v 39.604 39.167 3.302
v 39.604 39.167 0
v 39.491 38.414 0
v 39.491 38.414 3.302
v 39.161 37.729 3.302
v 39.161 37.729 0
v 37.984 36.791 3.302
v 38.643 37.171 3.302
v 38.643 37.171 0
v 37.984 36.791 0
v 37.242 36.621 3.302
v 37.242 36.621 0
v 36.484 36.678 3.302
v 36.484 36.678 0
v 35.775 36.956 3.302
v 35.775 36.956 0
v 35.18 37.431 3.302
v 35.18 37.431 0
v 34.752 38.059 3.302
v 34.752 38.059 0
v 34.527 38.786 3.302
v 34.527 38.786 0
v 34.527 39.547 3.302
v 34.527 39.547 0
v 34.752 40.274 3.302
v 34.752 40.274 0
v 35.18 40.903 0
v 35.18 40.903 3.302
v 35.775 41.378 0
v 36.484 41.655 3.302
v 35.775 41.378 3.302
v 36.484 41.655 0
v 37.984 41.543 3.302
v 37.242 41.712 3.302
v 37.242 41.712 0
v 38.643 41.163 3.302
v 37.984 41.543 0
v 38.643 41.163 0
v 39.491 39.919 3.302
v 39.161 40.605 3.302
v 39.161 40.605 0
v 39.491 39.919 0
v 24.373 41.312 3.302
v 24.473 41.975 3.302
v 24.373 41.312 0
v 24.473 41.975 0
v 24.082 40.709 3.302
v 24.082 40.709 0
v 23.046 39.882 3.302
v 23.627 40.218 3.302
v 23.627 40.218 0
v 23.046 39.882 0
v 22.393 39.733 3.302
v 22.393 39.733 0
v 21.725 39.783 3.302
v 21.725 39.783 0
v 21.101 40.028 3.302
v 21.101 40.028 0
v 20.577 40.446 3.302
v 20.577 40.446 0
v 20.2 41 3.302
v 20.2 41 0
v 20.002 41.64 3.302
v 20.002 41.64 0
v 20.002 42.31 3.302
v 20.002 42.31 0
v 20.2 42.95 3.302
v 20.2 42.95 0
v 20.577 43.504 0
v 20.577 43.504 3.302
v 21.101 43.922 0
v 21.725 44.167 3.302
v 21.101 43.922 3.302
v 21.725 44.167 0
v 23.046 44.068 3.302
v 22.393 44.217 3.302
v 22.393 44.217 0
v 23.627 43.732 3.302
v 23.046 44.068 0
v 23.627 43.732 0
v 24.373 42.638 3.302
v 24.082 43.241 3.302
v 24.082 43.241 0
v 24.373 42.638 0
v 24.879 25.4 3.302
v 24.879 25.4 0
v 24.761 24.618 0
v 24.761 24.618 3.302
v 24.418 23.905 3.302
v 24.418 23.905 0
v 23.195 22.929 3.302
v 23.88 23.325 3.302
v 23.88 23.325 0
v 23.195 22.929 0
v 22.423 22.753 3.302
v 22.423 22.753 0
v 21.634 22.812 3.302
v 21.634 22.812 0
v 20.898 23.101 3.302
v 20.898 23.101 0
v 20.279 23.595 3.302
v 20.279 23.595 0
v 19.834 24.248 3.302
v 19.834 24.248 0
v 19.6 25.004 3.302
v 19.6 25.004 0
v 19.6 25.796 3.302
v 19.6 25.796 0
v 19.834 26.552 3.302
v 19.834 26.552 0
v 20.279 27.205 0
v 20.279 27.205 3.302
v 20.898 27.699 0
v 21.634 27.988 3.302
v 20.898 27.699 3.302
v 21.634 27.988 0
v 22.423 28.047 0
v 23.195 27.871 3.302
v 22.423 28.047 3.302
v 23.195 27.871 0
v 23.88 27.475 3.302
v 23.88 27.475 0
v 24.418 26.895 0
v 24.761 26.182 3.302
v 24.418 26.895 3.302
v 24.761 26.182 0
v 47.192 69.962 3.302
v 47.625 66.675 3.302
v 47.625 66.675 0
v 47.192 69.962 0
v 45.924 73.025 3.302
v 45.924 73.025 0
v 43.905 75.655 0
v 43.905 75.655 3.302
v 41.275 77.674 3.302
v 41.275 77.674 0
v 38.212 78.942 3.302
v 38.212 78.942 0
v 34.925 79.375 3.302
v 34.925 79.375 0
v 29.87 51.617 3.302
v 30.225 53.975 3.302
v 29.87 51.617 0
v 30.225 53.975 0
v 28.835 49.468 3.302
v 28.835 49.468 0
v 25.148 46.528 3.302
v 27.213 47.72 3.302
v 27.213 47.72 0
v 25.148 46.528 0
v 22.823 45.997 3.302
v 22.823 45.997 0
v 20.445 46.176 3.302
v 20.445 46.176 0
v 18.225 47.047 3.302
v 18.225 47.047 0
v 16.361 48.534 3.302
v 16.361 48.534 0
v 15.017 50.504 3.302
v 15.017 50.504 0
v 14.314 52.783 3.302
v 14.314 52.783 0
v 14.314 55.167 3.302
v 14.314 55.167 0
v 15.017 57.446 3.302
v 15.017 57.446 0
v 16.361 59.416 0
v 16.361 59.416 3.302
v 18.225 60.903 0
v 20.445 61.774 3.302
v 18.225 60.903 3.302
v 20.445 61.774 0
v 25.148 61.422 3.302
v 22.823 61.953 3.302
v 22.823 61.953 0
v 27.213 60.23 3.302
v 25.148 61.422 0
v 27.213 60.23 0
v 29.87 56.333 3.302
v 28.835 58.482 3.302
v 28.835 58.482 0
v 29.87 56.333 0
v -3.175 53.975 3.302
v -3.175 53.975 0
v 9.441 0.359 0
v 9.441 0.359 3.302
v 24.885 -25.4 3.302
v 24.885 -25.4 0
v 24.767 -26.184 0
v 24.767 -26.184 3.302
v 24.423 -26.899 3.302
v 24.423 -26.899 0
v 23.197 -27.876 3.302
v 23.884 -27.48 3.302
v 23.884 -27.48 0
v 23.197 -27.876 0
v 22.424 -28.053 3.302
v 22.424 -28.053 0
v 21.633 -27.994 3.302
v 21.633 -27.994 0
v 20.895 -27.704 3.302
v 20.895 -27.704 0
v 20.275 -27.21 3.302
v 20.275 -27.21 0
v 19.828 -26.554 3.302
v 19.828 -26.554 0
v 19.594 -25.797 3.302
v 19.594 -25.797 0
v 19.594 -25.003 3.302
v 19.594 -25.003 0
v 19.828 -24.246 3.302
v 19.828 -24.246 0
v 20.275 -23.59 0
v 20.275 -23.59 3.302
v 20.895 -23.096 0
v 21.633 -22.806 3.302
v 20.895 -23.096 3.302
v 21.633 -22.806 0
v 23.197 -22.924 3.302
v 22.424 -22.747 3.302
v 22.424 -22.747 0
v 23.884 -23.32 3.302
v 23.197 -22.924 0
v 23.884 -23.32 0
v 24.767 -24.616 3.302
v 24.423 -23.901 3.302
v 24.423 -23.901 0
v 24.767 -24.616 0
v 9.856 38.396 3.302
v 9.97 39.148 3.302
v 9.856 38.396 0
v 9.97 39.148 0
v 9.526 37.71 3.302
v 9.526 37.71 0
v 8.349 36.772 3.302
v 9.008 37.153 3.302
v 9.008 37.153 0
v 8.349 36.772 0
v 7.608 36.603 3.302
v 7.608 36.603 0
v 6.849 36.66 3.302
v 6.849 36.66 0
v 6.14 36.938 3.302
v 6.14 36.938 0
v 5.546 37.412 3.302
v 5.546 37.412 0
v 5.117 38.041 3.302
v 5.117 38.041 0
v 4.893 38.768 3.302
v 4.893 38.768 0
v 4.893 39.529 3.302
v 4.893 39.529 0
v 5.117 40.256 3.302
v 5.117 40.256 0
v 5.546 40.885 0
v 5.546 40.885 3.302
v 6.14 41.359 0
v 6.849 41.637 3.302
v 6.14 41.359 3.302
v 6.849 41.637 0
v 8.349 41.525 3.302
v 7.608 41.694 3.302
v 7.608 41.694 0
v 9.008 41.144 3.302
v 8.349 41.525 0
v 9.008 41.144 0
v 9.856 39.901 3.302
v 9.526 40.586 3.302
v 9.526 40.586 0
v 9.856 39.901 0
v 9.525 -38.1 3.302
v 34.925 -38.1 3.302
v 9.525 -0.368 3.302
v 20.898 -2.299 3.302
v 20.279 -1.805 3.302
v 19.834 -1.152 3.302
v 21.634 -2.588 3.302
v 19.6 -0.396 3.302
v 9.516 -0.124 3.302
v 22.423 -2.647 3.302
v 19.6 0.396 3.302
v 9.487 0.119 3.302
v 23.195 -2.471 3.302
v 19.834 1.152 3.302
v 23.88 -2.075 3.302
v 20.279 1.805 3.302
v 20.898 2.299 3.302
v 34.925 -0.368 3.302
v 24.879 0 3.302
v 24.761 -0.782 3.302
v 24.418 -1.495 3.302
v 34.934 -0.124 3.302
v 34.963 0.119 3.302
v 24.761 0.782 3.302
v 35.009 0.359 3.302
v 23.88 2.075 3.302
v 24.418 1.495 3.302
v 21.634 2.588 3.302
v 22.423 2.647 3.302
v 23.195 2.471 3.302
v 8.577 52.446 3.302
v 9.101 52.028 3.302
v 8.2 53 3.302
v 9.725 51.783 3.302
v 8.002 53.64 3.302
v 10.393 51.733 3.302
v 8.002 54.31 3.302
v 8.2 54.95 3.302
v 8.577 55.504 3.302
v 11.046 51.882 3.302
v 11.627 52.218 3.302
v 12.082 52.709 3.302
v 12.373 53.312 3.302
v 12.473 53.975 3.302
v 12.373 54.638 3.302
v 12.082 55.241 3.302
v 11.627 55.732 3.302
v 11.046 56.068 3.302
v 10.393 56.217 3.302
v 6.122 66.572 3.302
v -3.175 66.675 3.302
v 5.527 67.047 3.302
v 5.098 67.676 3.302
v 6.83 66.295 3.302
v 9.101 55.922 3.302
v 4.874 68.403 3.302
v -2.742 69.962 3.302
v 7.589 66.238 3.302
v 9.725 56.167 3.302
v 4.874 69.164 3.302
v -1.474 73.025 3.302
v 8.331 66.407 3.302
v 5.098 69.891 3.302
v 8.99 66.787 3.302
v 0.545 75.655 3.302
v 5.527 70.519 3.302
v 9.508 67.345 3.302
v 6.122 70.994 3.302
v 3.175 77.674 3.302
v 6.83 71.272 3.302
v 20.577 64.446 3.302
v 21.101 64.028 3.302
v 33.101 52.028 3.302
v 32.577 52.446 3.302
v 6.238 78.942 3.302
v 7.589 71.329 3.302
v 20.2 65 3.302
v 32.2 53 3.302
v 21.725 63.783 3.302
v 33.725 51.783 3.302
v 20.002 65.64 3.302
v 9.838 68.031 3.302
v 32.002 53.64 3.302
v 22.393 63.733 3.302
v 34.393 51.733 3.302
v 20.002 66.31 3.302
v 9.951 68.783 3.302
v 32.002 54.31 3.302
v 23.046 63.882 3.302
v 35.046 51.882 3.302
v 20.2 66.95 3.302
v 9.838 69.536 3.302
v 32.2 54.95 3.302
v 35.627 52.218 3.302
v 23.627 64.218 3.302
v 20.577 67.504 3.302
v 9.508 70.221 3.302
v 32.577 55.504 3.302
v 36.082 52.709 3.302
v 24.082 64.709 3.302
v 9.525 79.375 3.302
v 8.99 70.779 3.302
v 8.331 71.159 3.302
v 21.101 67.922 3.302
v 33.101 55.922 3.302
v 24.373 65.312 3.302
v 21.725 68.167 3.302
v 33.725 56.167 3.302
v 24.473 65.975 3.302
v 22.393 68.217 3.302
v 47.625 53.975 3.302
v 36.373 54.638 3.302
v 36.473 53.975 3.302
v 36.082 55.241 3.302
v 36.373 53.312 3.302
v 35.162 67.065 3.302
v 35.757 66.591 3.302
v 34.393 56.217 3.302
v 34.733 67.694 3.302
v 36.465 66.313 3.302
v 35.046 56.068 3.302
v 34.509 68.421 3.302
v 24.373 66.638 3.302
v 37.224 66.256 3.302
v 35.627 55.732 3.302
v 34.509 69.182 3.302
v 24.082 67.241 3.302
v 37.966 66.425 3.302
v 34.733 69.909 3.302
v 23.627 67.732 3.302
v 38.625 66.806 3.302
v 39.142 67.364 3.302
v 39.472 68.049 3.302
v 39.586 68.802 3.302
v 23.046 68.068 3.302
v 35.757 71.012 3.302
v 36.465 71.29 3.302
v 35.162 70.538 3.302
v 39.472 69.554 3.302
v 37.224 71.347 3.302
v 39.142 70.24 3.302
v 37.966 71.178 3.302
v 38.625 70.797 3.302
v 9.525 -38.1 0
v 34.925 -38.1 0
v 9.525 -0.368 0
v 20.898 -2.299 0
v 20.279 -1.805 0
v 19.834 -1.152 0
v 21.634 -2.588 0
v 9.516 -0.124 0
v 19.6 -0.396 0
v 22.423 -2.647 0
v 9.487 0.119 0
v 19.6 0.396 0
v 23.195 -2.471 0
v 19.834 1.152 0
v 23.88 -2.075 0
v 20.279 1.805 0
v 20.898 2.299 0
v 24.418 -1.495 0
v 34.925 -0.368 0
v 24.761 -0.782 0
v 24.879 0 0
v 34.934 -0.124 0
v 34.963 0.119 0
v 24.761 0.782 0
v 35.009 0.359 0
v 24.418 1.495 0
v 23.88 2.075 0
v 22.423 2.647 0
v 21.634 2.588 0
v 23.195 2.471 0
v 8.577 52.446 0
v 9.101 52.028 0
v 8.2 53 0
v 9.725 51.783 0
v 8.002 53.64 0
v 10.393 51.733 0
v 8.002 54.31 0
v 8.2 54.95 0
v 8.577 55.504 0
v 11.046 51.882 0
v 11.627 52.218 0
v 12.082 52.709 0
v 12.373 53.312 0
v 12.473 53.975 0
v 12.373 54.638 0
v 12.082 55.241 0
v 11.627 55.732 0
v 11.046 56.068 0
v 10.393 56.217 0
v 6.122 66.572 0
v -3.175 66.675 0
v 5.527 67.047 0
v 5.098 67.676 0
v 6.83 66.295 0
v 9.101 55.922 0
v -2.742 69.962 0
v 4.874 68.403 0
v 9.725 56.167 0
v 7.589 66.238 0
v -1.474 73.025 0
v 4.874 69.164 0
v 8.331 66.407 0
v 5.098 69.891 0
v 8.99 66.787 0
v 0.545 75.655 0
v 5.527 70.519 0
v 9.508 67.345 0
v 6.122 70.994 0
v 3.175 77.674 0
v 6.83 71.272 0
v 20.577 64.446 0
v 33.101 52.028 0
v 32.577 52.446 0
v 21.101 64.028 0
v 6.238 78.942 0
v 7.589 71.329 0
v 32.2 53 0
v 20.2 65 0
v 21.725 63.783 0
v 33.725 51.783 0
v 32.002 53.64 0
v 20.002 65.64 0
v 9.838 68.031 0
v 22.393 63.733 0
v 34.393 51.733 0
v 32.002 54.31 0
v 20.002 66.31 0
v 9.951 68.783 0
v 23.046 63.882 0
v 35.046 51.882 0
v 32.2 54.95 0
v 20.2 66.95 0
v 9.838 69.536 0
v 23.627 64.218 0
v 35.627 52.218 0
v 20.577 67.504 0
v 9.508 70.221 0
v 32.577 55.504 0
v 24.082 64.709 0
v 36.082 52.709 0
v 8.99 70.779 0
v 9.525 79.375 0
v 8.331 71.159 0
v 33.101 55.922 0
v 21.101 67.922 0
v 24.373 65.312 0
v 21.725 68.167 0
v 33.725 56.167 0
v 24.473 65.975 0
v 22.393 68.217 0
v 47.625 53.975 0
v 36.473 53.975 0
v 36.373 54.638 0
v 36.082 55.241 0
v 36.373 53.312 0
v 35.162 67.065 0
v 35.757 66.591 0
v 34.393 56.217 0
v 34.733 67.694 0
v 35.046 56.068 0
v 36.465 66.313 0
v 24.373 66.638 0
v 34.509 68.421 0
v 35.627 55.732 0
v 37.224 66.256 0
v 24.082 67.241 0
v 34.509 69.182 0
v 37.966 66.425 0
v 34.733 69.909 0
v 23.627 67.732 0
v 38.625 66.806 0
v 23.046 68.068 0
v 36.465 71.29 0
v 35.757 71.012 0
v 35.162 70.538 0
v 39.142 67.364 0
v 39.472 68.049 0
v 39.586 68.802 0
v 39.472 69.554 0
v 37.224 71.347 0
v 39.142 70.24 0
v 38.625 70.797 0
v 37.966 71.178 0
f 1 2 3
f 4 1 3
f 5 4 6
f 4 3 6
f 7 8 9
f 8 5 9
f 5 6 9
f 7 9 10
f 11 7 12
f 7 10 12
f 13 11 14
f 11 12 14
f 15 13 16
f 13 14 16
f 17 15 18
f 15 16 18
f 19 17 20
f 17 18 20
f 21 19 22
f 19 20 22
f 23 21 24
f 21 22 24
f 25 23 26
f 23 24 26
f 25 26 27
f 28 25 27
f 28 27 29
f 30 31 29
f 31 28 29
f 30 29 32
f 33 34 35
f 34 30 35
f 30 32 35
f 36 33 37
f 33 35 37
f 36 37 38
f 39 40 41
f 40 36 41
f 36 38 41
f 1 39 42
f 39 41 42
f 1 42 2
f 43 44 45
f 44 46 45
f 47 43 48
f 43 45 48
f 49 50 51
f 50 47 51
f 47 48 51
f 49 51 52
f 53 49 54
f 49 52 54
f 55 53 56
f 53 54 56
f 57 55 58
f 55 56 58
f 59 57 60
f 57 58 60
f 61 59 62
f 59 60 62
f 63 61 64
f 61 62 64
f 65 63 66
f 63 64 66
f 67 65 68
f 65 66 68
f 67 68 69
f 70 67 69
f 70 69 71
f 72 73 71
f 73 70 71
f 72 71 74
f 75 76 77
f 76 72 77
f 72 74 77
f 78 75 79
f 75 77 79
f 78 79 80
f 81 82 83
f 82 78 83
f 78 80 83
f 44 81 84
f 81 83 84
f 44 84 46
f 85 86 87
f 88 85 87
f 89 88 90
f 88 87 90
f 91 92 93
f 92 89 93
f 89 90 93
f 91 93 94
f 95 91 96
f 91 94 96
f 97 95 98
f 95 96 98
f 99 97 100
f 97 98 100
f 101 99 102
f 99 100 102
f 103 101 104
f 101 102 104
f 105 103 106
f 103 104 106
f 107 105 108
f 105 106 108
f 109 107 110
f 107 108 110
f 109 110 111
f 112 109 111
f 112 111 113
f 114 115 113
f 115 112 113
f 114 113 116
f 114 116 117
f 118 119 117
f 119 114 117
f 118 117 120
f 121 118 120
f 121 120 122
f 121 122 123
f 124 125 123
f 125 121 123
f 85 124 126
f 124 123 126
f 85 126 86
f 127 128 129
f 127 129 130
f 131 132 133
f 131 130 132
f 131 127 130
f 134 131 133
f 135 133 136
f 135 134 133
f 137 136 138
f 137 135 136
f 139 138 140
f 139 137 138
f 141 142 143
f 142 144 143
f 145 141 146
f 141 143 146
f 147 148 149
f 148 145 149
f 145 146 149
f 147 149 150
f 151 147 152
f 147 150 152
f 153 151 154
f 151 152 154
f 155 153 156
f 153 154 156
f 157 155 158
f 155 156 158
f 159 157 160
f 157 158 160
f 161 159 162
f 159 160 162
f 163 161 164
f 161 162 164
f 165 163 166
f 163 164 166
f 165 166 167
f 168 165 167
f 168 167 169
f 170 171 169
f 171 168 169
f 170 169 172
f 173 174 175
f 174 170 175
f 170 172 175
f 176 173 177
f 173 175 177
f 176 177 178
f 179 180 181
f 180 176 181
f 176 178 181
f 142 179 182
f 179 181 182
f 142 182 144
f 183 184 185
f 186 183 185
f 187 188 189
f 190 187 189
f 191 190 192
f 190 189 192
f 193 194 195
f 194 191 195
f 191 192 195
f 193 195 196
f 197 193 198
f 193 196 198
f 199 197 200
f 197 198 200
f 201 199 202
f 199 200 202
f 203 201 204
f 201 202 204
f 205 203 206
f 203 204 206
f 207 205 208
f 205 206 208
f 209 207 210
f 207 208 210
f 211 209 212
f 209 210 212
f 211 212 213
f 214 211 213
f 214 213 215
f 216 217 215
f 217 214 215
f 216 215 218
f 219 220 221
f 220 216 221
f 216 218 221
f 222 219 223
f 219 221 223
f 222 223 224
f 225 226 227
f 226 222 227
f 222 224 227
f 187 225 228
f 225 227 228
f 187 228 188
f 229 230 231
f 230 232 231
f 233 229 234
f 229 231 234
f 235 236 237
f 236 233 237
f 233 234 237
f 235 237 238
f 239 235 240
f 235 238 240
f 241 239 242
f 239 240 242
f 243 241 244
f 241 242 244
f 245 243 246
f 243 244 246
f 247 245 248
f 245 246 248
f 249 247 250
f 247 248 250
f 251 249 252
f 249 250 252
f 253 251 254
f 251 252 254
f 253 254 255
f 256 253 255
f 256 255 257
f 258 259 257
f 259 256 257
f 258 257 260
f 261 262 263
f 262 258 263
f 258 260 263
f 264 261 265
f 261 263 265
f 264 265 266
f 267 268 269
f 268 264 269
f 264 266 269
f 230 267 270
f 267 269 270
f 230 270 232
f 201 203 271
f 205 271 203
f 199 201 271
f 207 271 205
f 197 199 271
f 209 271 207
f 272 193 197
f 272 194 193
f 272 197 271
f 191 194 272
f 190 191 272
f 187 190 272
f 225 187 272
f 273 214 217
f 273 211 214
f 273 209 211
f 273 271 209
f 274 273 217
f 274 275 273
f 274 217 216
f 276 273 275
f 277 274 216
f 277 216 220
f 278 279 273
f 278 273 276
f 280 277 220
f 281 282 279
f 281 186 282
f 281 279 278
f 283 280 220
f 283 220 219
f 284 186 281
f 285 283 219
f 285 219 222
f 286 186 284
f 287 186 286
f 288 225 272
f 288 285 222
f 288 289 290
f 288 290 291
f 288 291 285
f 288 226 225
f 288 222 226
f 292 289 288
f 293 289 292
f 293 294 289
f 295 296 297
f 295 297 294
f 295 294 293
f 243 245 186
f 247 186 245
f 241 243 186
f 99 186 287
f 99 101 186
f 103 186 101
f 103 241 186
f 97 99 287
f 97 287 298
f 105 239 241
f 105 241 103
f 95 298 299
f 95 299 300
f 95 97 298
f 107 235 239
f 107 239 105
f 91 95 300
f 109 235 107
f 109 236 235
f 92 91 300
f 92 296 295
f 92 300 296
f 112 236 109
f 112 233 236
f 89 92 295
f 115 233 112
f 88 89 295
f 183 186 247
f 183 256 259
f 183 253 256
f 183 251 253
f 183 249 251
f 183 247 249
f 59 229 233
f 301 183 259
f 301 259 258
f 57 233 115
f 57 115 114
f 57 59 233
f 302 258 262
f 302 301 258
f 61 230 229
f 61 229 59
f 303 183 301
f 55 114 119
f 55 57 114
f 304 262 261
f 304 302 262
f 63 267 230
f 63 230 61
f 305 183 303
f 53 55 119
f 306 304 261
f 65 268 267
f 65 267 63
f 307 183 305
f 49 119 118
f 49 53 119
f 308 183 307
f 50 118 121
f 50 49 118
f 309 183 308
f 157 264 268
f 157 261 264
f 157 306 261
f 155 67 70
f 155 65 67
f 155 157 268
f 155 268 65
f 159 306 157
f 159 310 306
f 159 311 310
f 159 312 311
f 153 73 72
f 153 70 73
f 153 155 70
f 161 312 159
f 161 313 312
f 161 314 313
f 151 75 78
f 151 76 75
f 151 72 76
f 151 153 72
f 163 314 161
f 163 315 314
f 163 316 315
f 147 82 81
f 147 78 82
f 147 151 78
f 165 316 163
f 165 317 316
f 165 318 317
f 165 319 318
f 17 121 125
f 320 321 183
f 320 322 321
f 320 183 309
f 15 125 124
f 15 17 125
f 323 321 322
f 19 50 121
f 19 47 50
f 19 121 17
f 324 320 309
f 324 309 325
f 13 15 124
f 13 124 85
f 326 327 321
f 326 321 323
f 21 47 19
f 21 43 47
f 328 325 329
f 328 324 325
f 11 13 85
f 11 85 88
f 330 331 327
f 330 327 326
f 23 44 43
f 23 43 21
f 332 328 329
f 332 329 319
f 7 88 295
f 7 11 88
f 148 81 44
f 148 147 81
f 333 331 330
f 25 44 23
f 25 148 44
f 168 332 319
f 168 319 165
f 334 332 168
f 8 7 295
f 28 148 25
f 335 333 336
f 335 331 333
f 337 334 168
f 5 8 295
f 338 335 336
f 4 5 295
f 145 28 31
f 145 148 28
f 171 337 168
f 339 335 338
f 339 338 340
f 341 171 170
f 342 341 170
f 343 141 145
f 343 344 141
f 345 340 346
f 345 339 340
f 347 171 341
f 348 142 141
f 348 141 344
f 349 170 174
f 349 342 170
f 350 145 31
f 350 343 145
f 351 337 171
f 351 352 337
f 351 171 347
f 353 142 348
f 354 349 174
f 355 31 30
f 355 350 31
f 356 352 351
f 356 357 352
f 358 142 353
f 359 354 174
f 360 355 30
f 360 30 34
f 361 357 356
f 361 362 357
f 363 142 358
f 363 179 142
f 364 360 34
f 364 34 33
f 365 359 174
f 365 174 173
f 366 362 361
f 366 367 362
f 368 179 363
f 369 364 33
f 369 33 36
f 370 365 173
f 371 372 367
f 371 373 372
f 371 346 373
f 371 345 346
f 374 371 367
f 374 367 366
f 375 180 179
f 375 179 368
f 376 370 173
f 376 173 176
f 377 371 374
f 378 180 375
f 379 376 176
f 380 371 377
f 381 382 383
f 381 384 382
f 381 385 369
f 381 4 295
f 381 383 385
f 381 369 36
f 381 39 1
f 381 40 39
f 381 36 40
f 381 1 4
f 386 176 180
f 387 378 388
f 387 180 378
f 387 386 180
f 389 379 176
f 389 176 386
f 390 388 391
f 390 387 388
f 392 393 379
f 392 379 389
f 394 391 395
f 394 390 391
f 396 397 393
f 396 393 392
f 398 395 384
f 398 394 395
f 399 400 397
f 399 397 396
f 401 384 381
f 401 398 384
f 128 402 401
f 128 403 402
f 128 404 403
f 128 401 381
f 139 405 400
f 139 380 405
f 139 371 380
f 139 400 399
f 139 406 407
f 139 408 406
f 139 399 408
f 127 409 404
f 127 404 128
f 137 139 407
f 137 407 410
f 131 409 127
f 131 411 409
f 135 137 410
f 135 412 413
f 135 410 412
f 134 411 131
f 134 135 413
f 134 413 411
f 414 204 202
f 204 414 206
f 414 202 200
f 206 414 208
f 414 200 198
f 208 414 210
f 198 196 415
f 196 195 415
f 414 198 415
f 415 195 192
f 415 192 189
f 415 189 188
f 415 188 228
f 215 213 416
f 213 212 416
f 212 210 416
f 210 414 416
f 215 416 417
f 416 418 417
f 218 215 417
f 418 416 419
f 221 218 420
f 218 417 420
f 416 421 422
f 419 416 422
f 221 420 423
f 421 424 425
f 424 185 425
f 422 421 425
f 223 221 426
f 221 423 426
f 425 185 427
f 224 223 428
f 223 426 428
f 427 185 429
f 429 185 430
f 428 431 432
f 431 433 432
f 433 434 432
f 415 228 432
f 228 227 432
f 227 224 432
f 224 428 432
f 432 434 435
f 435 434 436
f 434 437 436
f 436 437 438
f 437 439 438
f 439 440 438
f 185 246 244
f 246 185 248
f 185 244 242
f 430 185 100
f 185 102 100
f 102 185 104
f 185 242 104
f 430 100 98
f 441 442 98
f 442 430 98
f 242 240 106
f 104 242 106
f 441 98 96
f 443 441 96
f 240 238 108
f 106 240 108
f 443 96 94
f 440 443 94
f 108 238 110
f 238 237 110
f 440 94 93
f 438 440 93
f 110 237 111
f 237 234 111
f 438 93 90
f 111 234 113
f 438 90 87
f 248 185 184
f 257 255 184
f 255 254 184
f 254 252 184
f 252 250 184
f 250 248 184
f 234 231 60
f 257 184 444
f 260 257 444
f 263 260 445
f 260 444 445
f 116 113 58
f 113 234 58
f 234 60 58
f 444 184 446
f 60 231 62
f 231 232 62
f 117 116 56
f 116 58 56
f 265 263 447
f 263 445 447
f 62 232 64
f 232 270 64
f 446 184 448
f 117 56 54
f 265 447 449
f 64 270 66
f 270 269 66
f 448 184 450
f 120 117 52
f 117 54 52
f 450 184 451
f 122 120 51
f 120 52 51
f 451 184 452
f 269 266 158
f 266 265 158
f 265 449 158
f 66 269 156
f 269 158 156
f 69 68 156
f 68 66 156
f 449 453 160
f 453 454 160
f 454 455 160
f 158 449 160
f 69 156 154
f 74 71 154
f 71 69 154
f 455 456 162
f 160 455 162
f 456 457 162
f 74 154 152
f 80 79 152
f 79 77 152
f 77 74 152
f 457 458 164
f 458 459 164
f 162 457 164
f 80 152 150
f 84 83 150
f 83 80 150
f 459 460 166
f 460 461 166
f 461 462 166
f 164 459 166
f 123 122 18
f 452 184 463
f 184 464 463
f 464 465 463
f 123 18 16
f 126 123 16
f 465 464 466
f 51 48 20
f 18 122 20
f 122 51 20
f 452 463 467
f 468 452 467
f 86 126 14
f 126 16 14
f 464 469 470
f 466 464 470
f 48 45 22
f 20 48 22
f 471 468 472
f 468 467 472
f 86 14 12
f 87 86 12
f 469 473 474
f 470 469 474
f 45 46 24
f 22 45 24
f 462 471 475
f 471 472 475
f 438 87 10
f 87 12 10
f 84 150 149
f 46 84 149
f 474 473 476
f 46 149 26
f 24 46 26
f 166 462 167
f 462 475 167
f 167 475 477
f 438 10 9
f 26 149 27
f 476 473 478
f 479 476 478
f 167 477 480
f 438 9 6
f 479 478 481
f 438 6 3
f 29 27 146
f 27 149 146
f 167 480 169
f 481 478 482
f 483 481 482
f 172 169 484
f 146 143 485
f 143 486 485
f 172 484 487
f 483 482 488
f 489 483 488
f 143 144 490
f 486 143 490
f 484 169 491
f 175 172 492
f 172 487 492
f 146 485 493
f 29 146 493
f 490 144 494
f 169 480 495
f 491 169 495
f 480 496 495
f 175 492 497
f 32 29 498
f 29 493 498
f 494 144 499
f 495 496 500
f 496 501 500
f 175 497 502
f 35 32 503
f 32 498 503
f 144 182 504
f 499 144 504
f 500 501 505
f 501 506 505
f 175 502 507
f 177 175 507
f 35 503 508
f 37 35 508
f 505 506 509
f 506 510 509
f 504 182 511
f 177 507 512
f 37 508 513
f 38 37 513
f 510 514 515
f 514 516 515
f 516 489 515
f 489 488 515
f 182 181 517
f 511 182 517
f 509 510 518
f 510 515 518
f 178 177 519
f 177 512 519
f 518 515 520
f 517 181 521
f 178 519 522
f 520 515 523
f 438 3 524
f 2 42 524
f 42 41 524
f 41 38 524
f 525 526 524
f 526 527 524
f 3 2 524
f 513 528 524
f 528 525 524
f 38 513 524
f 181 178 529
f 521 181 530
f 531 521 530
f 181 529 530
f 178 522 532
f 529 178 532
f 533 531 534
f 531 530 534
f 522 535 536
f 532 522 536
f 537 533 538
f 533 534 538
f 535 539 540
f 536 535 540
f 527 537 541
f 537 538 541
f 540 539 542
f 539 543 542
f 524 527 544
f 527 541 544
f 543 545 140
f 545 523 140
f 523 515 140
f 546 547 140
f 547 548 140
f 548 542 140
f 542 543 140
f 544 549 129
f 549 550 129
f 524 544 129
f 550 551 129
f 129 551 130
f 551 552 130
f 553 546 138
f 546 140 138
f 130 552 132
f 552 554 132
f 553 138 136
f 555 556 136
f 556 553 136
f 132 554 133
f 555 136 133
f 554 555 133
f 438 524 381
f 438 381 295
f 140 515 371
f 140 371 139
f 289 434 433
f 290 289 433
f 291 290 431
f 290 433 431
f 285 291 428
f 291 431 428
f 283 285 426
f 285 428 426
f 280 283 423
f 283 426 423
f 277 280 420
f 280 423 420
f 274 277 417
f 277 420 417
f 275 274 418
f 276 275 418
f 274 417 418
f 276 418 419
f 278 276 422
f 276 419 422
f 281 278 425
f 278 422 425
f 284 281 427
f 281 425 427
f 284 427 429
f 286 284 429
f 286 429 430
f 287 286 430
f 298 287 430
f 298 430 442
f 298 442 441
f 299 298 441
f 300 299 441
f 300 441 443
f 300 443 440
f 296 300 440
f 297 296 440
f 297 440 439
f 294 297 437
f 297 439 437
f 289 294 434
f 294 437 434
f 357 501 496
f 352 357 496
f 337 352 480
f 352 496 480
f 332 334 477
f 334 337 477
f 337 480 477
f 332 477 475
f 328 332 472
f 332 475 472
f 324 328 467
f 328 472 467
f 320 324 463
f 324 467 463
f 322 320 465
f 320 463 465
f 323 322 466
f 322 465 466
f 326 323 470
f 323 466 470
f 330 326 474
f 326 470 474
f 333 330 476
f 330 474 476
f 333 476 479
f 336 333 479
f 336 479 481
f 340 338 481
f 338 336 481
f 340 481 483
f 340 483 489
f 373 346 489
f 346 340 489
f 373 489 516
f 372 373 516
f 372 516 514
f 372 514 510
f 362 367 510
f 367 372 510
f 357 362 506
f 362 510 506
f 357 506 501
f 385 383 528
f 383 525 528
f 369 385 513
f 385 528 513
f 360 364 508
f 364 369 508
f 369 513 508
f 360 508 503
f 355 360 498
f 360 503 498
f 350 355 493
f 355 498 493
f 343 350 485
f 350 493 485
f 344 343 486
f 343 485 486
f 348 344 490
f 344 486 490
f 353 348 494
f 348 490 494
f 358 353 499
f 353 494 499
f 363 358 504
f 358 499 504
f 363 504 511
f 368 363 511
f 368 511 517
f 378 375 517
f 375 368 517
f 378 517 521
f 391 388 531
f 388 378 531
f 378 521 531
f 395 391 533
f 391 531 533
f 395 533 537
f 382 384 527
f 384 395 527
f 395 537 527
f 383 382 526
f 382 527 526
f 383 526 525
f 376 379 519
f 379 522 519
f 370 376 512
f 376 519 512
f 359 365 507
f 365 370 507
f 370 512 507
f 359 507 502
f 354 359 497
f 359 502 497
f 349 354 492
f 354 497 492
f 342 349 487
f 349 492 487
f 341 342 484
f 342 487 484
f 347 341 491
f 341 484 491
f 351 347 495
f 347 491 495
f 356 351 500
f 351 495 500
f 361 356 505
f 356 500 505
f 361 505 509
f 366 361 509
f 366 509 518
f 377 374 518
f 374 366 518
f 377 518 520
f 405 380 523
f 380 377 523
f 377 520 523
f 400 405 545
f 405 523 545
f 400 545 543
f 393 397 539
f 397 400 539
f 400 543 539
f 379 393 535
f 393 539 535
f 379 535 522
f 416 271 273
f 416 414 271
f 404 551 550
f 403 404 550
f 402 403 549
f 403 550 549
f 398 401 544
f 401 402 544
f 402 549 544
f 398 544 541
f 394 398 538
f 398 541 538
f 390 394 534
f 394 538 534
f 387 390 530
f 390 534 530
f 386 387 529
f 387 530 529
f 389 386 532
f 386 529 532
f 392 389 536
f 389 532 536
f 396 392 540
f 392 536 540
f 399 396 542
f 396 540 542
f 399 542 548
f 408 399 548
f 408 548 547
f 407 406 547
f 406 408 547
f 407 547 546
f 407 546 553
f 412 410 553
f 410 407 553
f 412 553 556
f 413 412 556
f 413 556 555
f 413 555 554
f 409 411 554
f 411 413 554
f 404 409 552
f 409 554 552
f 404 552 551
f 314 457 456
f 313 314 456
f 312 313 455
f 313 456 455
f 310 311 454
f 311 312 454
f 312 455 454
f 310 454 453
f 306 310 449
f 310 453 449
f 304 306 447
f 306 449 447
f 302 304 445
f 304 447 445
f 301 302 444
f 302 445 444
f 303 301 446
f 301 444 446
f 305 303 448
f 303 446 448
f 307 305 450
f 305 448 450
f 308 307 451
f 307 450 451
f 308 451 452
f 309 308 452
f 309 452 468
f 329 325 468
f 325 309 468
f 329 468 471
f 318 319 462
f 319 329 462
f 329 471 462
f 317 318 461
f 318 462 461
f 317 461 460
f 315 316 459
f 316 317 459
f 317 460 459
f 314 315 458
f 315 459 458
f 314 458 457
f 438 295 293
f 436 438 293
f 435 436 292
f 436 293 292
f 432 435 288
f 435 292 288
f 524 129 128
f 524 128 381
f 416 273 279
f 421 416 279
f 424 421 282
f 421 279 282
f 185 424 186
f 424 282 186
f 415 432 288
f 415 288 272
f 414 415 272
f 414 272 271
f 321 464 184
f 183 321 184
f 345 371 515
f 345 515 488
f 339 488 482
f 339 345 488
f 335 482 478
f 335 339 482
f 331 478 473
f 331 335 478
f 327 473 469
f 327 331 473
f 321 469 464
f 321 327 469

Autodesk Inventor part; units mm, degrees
ref_plane "YZ Plane" through (0, 0, 0) normal (1, 0, 0) x (0, 1, 0)
ref_plane "XZ Plane" through (0, 0, 0) normal (0, 1, 0) x (-1, 0, 0)
ref_plane "XY Plane" through (0, 0, 0) normal (0, 0, 1) x (1, 0, 0)
sketch "Sketch1" plane through (0, 0, 0) normal (0, 0, 1) x (1, 0, 0)
  circle A0 centre (22.225, 53.975) radius 8
  circle A1 centre (22.225, 25.4) radius 2.6543
  circle A2 centre (22.225, 0) radius 2.6543
  line L0 (9.525, 0) -> (34.925, 0)
  circle A3 centre (22.225, -25.4) radius 2.6604
  line L1 (34.925, 0) -> (34.925, -38.1)
  line L2 (34.925, -38.1) -> (9.525, -38.1)
  line L3 (9.525, -38.1) -> (9.525, 0)
  circle A4 centre (10.225, 53.975) radius 2.2479
  circle A5 centre (22.225, 65.975) radius 2.2479
  circle A6 centre (22.225, 41.975) radius 2.2479
  circle A7 centre (34.225, 53.975) radius 2.2479
  circle A8 centre (22.225, 53.975) radius 20.955 construction
  circle A9 centre (7.4168, 39.1484) radius 2.5527
  circle A10 centre (37.0516, 39.1668) radius 2.5527
  circle A11 centre (37.0332, 68.8016) radius 2.5527
  circle A12 centre (7.3984, 68.7832) radius 2.5527
  line L4 (-3.175, 79.375) -> (47.625, 79.375)
  line L5 (-3.175, 79.375) -> (-3.175, 53.975)
  line L6 (-3.175, 53.975) -> (9.525, 0)
  line L7 (47.625, 79.375) -> (47.625, 53.975)
  line L8 (47.625, 53.975) -> (34.925, 0)
  point P0 (0, 0)
  point P1 (0, 53.975)
  point P2 (44.45, 53.975)
  point P3 (22.225, 76.2)
  point P4 (24.8793, 0)
  point P5 (19.5707, 0)
  point P6 (22.225, 0)
  point P7 (22.225, 79.375)
  dimension "d36" = 41.91
  dimension "d2" = 16
  dimension "d3" = 5.3086
  dimension "d4" = 5.3086
  dimension "d5" = 22.225
  dimension "d26" = 25.4
  dimension "d27" = 38.1
  dimension "d28" = 25.4
  dimension "d29" = 28.575
  dimension "d30" = 53.975
  dimension "d31" = 4.4958
  dimension "d32" = 12
  dimension "d33" = 12
  dimension "d34" = 12
  dimension "d35" = 12
  dimension "d37" = 5.1054
  dimension "d38" = 14.8082
  dimension "d41" = 360
  dimension "d43" = 50.8
  dimension "d44" = 0
  dimension "d45" = 25.4
  dimension "d46" = 25.4
  dimension "d47" = 25.4
extrude "Extrusion1" add sketch "Sketch1" along normal blind 3.302 contours L0 L1 L2 L3 A2 | A2 L0 L6 L5 L4 L7 L8
fillet "Fillet13" radius 3.175 1 edges at (34.925, 0, 1.651)
fillet "Fillet14" radius 3.175 1 edges at (9.525, 0, 1.651)
fillet "Fillet15" radius 12.7 2 edges at (-3.175, 79.375, 1.651) (47.625, 79.375, 1.651)
properties part number "Arm Plate4"
